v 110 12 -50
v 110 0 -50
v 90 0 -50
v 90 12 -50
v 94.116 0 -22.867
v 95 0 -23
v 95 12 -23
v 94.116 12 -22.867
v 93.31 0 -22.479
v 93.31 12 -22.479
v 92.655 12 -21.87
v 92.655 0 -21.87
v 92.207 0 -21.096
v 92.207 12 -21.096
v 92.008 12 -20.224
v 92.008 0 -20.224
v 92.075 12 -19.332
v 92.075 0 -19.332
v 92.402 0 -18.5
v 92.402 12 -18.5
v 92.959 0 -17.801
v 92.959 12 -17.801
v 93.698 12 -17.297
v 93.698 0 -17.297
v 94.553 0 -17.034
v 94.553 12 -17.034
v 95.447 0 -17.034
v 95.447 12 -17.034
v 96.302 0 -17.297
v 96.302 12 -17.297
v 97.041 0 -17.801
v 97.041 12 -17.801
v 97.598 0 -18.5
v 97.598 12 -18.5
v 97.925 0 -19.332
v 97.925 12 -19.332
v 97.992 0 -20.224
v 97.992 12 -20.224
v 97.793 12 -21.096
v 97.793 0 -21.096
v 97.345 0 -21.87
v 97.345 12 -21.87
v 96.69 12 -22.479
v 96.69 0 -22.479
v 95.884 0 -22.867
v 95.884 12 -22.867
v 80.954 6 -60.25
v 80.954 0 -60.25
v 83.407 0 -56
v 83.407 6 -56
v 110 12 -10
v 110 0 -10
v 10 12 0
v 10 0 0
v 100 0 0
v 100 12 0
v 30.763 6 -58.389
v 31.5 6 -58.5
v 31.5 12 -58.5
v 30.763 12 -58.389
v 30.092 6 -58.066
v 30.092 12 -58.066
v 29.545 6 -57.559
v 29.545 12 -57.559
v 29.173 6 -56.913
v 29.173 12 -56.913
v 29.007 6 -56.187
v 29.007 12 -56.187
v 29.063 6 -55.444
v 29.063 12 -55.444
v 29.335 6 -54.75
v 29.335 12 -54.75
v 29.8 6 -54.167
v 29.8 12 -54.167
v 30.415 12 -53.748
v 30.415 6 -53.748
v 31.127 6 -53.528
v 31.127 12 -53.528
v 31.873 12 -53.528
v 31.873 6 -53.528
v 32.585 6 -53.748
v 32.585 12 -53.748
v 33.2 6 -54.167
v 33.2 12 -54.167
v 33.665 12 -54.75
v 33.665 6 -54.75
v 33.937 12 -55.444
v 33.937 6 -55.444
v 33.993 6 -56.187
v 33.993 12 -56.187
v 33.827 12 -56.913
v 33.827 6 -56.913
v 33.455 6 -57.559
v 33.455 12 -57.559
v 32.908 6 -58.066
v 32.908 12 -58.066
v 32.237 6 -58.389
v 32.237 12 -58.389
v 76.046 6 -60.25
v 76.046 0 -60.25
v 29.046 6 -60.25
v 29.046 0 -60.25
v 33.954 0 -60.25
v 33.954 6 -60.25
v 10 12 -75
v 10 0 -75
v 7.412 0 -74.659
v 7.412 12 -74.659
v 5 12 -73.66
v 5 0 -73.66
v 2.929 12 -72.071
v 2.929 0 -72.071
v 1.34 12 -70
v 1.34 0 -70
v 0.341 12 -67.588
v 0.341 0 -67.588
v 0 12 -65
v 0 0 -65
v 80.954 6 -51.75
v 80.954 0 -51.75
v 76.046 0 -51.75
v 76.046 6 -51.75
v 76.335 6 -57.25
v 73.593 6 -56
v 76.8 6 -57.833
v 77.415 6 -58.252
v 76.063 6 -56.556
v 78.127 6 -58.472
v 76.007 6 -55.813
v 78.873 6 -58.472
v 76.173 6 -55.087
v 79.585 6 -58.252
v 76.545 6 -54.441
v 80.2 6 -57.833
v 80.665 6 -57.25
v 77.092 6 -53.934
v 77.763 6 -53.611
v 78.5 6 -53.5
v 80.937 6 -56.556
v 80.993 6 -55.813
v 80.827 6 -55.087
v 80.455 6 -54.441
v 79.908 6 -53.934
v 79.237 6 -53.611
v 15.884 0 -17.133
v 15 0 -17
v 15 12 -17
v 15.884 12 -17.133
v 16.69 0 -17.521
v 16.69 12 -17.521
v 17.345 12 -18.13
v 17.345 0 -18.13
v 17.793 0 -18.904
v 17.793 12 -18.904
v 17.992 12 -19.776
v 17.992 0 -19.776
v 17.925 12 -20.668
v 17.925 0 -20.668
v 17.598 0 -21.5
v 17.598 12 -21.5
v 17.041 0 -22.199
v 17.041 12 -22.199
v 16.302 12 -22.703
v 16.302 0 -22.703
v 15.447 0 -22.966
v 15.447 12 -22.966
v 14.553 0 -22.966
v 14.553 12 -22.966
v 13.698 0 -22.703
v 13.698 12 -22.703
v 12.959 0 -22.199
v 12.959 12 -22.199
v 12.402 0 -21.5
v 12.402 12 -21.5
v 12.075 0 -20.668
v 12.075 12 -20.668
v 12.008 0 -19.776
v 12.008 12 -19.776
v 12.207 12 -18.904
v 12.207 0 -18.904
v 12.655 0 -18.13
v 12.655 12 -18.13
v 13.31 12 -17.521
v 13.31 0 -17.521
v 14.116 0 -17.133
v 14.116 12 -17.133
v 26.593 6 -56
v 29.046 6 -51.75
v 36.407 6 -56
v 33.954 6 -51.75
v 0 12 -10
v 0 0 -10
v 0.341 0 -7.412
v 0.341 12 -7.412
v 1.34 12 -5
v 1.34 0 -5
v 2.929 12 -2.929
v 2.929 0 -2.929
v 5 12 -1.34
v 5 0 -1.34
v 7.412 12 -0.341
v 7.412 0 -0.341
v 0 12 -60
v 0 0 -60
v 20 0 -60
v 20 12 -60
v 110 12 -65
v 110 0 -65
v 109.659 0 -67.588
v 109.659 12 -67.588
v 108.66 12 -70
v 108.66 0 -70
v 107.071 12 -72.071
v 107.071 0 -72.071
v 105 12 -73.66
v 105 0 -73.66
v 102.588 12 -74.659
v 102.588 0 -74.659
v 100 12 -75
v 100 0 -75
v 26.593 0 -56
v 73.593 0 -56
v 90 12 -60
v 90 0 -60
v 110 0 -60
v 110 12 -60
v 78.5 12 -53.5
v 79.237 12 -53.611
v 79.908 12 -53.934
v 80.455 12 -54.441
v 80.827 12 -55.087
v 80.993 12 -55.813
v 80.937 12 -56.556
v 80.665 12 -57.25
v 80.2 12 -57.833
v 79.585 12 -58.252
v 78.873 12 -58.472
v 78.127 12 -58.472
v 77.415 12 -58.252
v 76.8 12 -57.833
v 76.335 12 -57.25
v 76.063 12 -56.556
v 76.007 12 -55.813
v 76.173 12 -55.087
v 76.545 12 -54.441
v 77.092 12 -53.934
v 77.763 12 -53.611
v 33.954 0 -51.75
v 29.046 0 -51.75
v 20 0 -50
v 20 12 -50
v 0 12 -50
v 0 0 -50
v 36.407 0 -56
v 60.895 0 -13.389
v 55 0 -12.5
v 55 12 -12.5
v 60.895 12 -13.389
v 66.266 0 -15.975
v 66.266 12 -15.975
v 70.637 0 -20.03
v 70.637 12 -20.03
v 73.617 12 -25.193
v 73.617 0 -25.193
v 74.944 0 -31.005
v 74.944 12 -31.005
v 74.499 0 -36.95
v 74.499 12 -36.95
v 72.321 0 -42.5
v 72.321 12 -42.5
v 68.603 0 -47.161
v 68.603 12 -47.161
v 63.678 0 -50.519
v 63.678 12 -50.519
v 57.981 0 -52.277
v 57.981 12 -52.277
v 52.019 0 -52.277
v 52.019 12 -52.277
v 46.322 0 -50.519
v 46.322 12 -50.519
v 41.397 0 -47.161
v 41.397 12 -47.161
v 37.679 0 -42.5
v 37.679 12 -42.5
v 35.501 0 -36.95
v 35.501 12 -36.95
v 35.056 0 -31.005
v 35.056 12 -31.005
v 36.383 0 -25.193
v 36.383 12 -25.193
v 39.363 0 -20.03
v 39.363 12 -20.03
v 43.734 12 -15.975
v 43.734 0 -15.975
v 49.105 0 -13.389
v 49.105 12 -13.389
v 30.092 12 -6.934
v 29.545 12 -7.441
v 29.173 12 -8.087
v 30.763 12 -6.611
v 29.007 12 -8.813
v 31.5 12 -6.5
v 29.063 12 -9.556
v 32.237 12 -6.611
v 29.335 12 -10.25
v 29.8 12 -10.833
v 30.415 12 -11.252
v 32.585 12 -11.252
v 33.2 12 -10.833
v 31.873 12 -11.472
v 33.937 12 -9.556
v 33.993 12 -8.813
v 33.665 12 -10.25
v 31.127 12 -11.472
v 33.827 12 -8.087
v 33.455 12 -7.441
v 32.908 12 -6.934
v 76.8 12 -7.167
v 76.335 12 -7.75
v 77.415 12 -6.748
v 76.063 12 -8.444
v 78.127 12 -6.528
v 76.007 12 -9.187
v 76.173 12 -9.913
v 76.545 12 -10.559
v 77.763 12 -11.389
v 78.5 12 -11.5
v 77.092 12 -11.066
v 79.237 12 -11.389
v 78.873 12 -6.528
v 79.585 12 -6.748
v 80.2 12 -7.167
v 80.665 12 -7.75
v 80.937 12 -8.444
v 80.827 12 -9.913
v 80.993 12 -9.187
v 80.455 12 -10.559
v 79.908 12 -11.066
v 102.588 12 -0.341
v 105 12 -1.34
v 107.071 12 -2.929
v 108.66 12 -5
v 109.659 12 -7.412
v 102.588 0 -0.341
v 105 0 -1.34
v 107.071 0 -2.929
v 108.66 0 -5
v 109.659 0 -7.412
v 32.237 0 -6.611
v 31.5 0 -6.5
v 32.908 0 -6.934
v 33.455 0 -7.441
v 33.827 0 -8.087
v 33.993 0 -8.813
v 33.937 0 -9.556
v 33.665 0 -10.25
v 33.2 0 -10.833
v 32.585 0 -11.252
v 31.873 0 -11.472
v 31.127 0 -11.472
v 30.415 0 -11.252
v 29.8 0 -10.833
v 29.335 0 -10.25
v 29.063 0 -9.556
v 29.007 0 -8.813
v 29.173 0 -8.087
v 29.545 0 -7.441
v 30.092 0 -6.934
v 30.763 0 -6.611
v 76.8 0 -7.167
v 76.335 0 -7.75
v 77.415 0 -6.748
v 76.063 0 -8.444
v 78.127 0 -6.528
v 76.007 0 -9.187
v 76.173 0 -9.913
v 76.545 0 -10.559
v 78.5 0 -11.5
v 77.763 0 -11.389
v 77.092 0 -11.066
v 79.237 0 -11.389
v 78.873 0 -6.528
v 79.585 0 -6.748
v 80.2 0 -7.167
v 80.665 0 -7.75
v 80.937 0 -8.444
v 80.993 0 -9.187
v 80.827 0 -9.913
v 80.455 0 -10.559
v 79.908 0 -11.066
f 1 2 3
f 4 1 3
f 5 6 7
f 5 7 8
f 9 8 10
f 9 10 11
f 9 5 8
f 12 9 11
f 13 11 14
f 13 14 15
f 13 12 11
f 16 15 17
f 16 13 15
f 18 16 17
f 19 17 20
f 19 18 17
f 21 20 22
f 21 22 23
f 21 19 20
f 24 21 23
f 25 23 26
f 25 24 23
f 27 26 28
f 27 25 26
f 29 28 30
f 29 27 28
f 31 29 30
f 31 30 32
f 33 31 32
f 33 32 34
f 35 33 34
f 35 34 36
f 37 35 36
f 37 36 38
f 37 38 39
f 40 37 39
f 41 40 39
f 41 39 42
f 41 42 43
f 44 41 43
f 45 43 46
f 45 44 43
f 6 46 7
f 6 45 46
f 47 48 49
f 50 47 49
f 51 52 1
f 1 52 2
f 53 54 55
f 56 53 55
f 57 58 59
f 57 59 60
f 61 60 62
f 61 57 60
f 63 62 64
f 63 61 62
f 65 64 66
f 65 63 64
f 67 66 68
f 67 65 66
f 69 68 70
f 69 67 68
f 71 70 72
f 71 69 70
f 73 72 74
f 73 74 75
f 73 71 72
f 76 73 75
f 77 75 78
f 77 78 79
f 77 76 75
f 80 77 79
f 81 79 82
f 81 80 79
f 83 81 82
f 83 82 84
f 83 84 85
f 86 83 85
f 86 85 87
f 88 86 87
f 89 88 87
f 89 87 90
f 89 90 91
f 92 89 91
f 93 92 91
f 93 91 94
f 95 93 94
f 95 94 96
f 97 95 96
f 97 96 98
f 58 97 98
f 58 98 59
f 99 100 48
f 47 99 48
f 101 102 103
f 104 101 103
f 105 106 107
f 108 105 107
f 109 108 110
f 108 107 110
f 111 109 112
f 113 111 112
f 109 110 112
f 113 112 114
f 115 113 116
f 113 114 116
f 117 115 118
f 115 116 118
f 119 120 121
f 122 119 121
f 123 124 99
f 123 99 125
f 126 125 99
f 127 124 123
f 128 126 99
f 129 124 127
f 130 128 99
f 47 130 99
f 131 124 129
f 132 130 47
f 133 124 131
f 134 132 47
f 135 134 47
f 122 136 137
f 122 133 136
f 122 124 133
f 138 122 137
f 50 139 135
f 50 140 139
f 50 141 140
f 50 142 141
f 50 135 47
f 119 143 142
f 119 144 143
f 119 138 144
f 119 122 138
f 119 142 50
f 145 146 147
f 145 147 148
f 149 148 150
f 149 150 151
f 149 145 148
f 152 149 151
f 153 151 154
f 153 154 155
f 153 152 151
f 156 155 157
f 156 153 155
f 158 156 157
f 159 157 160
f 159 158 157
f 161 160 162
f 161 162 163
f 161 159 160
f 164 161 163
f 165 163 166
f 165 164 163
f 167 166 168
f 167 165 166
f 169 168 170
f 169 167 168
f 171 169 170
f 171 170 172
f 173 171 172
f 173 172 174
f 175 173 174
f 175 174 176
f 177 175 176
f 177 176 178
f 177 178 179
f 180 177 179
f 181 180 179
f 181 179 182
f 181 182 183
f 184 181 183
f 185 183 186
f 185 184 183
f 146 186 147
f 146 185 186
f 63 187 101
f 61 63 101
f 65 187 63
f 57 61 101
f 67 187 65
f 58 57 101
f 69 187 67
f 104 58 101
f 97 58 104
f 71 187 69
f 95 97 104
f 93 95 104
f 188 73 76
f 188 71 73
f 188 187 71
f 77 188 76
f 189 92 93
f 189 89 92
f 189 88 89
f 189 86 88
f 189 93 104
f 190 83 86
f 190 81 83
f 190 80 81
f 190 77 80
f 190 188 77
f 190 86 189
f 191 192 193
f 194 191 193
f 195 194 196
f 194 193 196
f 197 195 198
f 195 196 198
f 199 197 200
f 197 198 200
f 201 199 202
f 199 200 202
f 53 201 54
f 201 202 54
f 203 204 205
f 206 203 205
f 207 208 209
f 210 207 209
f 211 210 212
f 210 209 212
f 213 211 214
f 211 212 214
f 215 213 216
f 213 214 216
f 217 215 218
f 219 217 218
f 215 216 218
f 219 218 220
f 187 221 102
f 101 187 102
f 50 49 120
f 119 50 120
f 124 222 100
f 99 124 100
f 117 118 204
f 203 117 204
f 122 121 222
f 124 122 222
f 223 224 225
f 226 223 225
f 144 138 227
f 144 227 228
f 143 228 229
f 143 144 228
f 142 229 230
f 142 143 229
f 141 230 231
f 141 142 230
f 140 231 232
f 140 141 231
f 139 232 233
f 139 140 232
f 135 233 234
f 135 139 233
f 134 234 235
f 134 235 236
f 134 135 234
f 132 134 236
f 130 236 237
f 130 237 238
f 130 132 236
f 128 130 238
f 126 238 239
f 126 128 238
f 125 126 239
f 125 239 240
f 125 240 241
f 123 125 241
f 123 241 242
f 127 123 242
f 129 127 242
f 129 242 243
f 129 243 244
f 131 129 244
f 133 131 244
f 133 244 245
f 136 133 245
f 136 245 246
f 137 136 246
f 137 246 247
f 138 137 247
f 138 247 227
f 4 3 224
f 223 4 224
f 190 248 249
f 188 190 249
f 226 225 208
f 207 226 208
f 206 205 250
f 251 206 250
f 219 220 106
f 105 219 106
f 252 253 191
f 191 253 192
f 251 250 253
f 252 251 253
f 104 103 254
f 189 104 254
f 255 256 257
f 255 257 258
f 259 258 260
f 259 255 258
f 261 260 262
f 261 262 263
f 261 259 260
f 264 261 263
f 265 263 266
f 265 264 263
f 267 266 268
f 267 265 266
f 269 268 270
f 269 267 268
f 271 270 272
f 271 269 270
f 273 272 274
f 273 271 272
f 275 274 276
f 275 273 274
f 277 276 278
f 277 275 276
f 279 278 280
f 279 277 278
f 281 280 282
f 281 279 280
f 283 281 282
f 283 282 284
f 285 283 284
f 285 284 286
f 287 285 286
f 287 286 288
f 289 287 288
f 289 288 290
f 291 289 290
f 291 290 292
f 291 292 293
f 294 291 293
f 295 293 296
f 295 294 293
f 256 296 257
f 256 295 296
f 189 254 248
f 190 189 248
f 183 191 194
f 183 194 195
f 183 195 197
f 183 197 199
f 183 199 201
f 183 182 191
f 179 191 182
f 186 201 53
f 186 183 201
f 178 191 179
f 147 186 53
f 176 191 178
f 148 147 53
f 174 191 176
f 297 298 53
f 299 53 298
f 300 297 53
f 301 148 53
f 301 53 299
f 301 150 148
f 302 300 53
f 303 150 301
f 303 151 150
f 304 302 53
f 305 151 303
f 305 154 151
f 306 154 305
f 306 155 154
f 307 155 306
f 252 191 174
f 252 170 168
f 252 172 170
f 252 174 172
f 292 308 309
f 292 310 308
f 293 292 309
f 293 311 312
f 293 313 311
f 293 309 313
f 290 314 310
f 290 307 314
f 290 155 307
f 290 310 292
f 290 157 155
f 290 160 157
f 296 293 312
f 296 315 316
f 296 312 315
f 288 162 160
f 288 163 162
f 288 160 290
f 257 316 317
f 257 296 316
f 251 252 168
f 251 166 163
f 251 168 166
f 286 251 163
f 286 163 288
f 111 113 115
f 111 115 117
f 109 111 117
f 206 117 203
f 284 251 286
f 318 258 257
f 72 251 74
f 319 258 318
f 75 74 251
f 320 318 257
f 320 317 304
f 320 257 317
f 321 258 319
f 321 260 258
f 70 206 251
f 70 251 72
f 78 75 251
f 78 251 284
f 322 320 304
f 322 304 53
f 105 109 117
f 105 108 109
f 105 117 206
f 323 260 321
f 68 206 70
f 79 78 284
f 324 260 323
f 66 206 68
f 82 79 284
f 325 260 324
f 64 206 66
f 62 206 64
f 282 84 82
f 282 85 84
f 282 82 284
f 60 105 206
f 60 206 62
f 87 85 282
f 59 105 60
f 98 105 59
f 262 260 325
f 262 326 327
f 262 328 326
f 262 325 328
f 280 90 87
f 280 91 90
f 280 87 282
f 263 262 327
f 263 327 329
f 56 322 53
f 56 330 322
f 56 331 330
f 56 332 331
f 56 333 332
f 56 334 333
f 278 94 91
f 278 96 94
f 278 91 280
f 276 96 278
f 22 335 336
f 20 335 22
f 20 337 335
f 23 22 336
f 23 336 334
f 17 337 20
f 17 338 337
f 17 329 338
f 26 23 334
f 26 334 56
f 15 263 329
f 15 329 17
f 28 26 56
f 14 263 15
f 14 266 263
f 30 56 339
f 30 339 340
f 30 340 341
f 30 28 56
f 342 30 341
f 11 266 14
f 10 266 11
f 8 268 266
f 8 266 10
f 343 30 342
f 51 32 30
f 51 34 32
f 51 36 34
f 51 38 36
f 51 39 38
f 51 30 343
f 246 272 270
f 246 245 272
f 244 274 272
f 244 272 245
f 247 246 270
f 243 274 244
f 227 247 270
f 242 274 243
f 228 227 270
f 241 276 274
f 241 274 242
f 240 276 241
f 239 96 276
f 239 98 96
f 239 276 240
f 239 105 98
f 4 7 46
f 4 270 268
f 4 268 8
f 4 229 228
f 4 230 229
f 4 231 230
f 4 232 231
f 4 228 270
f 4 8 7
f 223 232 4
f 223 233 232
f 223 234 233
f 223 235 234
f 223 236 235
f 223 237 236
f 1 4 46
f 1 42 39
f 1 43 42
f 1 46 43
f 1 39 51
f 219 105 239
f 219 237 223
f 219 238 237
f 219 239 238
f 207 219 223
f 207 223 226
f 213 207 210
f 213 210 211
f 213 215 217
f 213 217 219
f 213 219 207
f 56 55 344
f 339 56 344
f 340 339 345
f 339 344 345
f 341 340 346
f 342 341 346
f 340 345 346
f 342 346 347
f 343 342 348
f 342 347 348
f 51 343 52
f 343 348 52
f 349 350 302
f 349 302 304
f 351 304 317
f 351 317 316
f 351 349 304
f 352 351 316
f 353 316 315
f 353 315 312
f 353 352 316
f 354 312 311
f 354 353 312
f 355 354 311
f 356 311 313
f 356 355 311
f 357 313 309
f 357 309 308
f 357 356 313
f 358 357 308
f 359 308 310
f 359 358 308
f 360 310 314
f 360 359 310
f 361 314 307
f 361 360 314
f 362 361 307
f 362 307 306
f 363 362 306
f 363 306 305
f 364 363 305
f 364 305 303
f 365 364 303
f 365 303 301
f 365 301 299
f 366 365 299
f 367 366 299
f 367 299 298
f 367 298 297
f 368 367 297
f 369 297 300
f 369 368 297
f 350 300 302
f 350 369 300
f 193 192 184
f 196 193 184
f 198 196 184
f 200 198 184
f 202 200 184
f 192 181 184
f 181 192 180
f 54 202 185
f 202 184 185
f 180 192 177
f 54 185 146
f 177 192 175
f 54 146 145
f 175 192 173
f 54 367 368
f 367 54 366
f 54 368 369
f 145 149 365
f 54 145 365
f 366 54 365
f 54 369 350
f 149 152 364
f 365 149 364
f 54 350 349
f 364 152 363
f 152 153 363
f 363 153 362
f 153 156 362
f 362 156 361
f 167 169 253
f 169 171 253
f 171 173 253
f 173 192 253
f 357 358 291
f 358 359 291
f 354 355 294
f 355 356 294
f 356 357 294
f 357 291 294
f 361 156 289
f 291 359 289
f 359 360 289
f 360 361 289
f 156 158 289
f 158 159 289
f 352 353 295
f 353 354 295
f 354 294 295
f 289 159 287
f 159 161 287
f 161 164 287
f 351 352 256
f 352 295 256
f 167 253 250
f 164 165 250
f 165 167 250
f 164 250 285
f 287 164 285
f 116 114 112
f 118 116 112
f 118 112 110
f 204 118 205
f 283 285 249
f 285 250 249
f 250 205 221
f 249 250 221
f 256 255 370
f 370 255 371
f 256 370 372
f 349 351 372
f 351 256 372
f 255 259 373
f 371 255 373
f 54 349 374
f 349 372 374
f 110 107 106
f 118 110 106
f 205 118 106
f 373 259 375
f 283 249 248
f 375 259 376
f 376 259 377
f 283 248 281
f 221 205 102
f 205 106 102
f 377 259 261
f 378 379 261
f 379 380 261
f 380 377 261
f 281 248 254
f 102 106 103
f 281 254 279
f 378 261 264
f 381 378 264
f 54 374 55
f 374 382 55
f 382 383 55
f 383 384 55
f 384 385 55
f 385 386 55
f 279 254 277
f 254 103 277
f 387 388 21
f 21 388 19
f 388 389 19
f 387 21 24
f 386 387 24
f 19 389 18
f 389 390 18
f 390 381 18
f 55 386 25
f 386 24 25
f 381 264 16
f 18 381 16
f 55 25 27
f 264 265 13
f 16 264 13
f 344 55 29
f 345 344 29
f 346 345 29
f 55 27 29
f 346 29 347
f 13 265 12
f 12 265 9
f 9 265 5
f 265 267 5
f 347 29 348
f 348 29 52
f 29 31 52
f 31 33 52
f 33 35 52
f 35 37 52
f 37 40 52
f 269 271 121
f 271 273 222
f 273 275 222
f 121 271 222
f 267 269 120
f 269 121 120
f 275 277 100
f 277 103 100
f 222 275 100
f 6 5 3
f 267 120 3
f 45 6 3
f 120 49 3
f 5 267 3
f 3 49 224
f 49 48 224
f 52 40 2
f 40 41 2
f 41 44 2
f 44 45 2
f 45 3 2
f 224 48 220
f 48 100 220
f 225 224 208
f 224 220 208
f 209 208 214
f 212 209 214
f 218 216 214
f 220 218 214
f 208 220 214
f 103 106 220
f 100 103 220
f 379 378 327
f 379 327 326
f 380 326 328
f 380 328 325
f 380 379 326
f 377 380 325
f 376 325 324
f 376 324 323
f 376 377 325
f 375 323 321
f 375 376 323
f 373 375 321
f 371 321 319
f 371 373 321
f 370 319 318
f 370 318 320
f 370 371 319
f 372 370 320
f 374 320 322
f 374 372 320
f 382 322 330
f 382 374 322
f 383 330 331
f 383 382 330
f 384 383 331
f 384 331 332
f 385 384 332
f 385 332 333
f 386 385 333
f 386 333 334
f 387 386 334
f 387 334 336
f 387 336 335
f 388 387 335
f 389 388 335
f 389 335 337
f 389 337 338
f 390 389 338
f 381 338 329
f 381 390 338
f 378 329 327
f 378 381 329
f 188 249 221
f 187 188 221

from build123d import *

# Parameters (mm, degrees)
SKETCH1_R           = 3
SKETCH1_R_2         = 2.5
SKETCH1_R_3         = 20
BOSS_EXTRUDE1_DEPTH = 12
CUT_EXTRUDE1_DEPTH  = 6


with BuildPart() as part:
    # Sketch1 → Boss-Extrude1 (new body)
    with BuildSketch(Plane(origin=(0, 0, 0), x_dir=(1, 0, 0), z_dir=(0, 1, 0))):
        with BuildLine():
            Line((10, 0), (100, 0))
            ThreePointArc((100, 0), (107.071067812, 2.928932188), (110, 10))
            Line((110, 10), (110, 50))
            Line((110, 50), (90, 50))
            Line((90, 50), (90, 60))
            Line((90, 60), (110, 60))
            Line((110, 60), (110, 65))
            ThreePointArc((110, 65), (107.071067812, 72.071067812), (100, 75))
            Line((100, 75), (10, 75))
            ThreePointArc((10, 75), (2.928932188, 72.071067812), (0, 65))
            Line((0, 65), (0, 60))
            Line((0, 60), (20, 60))
            Line((20, 60), (20, 50))
            Line((20, 50), (0, 50))
            Line((0, 50), (0, 10))
            ThreePointArc((0, 10), (2.928932188, 2.928932188), (10, 0))
        make_face()
        with Locations(Location((15, 20, 0), (0, 0, 270))):
            Circle(SKETCH1_R, mode=Mode.SUBTRACT)
        with Locations(Location((78.5, 56, 0), (0, 0, 270))):
            Circle(SKETCH1_R_2, mode=Mode.SUBTRACT)
        with Locations(Location((95, 20, 0), (0, 0, 90))):
            Circle(SKETCH1_R, mode=Mode.SUBTRACT)
        with Locations(Location((55, 32.5, 0), (0, 0, 270))):
            Circle(SKETCH1_R_3, mode=Mode.SUBTRACT)
        with Locations(Location((31.5, 56, 0), (0, 0, 90))):
            Circle(SKETCH1_R_2, mode=Mode.SUBTRACT)
        with Locations(Location((78.5, 9, 0), (0, 0, 90))):
            Circle(SKETCH1_R_2, mode=Mode.SUBTRACT)
        with Locations(Location((31.5, 9, 0), (0, 0, 270))):
            Circle(SKETCH1_R_2, mode=Mode.SUBTRACT)
    extrude(amount=BOSS_EXTRUDE1_DEPTH)

    # Sketch2 → Cut-Extrude1 (cut)
    with BuildSketch(Plane.XZ):
        Polygon((29.046261356, -51.75), (26.592522712, -56), (29.046261356, -60.25), (33.953738644, -60.25), (36.407477288, -56), (33.953738644, -51.75), align=None)
        Polygon((76.046261356, -51.75), (73.592522712, -56), (76.046261356, -60.25), (80.953738644, -60.25), (83.407477288, -56), (80.953738644, -51.75), align=None)
    extrude(amount=-CUT_EXTRUDE1_DEPTH, mode=Mode.SUBTRACT)


solid = part.part
